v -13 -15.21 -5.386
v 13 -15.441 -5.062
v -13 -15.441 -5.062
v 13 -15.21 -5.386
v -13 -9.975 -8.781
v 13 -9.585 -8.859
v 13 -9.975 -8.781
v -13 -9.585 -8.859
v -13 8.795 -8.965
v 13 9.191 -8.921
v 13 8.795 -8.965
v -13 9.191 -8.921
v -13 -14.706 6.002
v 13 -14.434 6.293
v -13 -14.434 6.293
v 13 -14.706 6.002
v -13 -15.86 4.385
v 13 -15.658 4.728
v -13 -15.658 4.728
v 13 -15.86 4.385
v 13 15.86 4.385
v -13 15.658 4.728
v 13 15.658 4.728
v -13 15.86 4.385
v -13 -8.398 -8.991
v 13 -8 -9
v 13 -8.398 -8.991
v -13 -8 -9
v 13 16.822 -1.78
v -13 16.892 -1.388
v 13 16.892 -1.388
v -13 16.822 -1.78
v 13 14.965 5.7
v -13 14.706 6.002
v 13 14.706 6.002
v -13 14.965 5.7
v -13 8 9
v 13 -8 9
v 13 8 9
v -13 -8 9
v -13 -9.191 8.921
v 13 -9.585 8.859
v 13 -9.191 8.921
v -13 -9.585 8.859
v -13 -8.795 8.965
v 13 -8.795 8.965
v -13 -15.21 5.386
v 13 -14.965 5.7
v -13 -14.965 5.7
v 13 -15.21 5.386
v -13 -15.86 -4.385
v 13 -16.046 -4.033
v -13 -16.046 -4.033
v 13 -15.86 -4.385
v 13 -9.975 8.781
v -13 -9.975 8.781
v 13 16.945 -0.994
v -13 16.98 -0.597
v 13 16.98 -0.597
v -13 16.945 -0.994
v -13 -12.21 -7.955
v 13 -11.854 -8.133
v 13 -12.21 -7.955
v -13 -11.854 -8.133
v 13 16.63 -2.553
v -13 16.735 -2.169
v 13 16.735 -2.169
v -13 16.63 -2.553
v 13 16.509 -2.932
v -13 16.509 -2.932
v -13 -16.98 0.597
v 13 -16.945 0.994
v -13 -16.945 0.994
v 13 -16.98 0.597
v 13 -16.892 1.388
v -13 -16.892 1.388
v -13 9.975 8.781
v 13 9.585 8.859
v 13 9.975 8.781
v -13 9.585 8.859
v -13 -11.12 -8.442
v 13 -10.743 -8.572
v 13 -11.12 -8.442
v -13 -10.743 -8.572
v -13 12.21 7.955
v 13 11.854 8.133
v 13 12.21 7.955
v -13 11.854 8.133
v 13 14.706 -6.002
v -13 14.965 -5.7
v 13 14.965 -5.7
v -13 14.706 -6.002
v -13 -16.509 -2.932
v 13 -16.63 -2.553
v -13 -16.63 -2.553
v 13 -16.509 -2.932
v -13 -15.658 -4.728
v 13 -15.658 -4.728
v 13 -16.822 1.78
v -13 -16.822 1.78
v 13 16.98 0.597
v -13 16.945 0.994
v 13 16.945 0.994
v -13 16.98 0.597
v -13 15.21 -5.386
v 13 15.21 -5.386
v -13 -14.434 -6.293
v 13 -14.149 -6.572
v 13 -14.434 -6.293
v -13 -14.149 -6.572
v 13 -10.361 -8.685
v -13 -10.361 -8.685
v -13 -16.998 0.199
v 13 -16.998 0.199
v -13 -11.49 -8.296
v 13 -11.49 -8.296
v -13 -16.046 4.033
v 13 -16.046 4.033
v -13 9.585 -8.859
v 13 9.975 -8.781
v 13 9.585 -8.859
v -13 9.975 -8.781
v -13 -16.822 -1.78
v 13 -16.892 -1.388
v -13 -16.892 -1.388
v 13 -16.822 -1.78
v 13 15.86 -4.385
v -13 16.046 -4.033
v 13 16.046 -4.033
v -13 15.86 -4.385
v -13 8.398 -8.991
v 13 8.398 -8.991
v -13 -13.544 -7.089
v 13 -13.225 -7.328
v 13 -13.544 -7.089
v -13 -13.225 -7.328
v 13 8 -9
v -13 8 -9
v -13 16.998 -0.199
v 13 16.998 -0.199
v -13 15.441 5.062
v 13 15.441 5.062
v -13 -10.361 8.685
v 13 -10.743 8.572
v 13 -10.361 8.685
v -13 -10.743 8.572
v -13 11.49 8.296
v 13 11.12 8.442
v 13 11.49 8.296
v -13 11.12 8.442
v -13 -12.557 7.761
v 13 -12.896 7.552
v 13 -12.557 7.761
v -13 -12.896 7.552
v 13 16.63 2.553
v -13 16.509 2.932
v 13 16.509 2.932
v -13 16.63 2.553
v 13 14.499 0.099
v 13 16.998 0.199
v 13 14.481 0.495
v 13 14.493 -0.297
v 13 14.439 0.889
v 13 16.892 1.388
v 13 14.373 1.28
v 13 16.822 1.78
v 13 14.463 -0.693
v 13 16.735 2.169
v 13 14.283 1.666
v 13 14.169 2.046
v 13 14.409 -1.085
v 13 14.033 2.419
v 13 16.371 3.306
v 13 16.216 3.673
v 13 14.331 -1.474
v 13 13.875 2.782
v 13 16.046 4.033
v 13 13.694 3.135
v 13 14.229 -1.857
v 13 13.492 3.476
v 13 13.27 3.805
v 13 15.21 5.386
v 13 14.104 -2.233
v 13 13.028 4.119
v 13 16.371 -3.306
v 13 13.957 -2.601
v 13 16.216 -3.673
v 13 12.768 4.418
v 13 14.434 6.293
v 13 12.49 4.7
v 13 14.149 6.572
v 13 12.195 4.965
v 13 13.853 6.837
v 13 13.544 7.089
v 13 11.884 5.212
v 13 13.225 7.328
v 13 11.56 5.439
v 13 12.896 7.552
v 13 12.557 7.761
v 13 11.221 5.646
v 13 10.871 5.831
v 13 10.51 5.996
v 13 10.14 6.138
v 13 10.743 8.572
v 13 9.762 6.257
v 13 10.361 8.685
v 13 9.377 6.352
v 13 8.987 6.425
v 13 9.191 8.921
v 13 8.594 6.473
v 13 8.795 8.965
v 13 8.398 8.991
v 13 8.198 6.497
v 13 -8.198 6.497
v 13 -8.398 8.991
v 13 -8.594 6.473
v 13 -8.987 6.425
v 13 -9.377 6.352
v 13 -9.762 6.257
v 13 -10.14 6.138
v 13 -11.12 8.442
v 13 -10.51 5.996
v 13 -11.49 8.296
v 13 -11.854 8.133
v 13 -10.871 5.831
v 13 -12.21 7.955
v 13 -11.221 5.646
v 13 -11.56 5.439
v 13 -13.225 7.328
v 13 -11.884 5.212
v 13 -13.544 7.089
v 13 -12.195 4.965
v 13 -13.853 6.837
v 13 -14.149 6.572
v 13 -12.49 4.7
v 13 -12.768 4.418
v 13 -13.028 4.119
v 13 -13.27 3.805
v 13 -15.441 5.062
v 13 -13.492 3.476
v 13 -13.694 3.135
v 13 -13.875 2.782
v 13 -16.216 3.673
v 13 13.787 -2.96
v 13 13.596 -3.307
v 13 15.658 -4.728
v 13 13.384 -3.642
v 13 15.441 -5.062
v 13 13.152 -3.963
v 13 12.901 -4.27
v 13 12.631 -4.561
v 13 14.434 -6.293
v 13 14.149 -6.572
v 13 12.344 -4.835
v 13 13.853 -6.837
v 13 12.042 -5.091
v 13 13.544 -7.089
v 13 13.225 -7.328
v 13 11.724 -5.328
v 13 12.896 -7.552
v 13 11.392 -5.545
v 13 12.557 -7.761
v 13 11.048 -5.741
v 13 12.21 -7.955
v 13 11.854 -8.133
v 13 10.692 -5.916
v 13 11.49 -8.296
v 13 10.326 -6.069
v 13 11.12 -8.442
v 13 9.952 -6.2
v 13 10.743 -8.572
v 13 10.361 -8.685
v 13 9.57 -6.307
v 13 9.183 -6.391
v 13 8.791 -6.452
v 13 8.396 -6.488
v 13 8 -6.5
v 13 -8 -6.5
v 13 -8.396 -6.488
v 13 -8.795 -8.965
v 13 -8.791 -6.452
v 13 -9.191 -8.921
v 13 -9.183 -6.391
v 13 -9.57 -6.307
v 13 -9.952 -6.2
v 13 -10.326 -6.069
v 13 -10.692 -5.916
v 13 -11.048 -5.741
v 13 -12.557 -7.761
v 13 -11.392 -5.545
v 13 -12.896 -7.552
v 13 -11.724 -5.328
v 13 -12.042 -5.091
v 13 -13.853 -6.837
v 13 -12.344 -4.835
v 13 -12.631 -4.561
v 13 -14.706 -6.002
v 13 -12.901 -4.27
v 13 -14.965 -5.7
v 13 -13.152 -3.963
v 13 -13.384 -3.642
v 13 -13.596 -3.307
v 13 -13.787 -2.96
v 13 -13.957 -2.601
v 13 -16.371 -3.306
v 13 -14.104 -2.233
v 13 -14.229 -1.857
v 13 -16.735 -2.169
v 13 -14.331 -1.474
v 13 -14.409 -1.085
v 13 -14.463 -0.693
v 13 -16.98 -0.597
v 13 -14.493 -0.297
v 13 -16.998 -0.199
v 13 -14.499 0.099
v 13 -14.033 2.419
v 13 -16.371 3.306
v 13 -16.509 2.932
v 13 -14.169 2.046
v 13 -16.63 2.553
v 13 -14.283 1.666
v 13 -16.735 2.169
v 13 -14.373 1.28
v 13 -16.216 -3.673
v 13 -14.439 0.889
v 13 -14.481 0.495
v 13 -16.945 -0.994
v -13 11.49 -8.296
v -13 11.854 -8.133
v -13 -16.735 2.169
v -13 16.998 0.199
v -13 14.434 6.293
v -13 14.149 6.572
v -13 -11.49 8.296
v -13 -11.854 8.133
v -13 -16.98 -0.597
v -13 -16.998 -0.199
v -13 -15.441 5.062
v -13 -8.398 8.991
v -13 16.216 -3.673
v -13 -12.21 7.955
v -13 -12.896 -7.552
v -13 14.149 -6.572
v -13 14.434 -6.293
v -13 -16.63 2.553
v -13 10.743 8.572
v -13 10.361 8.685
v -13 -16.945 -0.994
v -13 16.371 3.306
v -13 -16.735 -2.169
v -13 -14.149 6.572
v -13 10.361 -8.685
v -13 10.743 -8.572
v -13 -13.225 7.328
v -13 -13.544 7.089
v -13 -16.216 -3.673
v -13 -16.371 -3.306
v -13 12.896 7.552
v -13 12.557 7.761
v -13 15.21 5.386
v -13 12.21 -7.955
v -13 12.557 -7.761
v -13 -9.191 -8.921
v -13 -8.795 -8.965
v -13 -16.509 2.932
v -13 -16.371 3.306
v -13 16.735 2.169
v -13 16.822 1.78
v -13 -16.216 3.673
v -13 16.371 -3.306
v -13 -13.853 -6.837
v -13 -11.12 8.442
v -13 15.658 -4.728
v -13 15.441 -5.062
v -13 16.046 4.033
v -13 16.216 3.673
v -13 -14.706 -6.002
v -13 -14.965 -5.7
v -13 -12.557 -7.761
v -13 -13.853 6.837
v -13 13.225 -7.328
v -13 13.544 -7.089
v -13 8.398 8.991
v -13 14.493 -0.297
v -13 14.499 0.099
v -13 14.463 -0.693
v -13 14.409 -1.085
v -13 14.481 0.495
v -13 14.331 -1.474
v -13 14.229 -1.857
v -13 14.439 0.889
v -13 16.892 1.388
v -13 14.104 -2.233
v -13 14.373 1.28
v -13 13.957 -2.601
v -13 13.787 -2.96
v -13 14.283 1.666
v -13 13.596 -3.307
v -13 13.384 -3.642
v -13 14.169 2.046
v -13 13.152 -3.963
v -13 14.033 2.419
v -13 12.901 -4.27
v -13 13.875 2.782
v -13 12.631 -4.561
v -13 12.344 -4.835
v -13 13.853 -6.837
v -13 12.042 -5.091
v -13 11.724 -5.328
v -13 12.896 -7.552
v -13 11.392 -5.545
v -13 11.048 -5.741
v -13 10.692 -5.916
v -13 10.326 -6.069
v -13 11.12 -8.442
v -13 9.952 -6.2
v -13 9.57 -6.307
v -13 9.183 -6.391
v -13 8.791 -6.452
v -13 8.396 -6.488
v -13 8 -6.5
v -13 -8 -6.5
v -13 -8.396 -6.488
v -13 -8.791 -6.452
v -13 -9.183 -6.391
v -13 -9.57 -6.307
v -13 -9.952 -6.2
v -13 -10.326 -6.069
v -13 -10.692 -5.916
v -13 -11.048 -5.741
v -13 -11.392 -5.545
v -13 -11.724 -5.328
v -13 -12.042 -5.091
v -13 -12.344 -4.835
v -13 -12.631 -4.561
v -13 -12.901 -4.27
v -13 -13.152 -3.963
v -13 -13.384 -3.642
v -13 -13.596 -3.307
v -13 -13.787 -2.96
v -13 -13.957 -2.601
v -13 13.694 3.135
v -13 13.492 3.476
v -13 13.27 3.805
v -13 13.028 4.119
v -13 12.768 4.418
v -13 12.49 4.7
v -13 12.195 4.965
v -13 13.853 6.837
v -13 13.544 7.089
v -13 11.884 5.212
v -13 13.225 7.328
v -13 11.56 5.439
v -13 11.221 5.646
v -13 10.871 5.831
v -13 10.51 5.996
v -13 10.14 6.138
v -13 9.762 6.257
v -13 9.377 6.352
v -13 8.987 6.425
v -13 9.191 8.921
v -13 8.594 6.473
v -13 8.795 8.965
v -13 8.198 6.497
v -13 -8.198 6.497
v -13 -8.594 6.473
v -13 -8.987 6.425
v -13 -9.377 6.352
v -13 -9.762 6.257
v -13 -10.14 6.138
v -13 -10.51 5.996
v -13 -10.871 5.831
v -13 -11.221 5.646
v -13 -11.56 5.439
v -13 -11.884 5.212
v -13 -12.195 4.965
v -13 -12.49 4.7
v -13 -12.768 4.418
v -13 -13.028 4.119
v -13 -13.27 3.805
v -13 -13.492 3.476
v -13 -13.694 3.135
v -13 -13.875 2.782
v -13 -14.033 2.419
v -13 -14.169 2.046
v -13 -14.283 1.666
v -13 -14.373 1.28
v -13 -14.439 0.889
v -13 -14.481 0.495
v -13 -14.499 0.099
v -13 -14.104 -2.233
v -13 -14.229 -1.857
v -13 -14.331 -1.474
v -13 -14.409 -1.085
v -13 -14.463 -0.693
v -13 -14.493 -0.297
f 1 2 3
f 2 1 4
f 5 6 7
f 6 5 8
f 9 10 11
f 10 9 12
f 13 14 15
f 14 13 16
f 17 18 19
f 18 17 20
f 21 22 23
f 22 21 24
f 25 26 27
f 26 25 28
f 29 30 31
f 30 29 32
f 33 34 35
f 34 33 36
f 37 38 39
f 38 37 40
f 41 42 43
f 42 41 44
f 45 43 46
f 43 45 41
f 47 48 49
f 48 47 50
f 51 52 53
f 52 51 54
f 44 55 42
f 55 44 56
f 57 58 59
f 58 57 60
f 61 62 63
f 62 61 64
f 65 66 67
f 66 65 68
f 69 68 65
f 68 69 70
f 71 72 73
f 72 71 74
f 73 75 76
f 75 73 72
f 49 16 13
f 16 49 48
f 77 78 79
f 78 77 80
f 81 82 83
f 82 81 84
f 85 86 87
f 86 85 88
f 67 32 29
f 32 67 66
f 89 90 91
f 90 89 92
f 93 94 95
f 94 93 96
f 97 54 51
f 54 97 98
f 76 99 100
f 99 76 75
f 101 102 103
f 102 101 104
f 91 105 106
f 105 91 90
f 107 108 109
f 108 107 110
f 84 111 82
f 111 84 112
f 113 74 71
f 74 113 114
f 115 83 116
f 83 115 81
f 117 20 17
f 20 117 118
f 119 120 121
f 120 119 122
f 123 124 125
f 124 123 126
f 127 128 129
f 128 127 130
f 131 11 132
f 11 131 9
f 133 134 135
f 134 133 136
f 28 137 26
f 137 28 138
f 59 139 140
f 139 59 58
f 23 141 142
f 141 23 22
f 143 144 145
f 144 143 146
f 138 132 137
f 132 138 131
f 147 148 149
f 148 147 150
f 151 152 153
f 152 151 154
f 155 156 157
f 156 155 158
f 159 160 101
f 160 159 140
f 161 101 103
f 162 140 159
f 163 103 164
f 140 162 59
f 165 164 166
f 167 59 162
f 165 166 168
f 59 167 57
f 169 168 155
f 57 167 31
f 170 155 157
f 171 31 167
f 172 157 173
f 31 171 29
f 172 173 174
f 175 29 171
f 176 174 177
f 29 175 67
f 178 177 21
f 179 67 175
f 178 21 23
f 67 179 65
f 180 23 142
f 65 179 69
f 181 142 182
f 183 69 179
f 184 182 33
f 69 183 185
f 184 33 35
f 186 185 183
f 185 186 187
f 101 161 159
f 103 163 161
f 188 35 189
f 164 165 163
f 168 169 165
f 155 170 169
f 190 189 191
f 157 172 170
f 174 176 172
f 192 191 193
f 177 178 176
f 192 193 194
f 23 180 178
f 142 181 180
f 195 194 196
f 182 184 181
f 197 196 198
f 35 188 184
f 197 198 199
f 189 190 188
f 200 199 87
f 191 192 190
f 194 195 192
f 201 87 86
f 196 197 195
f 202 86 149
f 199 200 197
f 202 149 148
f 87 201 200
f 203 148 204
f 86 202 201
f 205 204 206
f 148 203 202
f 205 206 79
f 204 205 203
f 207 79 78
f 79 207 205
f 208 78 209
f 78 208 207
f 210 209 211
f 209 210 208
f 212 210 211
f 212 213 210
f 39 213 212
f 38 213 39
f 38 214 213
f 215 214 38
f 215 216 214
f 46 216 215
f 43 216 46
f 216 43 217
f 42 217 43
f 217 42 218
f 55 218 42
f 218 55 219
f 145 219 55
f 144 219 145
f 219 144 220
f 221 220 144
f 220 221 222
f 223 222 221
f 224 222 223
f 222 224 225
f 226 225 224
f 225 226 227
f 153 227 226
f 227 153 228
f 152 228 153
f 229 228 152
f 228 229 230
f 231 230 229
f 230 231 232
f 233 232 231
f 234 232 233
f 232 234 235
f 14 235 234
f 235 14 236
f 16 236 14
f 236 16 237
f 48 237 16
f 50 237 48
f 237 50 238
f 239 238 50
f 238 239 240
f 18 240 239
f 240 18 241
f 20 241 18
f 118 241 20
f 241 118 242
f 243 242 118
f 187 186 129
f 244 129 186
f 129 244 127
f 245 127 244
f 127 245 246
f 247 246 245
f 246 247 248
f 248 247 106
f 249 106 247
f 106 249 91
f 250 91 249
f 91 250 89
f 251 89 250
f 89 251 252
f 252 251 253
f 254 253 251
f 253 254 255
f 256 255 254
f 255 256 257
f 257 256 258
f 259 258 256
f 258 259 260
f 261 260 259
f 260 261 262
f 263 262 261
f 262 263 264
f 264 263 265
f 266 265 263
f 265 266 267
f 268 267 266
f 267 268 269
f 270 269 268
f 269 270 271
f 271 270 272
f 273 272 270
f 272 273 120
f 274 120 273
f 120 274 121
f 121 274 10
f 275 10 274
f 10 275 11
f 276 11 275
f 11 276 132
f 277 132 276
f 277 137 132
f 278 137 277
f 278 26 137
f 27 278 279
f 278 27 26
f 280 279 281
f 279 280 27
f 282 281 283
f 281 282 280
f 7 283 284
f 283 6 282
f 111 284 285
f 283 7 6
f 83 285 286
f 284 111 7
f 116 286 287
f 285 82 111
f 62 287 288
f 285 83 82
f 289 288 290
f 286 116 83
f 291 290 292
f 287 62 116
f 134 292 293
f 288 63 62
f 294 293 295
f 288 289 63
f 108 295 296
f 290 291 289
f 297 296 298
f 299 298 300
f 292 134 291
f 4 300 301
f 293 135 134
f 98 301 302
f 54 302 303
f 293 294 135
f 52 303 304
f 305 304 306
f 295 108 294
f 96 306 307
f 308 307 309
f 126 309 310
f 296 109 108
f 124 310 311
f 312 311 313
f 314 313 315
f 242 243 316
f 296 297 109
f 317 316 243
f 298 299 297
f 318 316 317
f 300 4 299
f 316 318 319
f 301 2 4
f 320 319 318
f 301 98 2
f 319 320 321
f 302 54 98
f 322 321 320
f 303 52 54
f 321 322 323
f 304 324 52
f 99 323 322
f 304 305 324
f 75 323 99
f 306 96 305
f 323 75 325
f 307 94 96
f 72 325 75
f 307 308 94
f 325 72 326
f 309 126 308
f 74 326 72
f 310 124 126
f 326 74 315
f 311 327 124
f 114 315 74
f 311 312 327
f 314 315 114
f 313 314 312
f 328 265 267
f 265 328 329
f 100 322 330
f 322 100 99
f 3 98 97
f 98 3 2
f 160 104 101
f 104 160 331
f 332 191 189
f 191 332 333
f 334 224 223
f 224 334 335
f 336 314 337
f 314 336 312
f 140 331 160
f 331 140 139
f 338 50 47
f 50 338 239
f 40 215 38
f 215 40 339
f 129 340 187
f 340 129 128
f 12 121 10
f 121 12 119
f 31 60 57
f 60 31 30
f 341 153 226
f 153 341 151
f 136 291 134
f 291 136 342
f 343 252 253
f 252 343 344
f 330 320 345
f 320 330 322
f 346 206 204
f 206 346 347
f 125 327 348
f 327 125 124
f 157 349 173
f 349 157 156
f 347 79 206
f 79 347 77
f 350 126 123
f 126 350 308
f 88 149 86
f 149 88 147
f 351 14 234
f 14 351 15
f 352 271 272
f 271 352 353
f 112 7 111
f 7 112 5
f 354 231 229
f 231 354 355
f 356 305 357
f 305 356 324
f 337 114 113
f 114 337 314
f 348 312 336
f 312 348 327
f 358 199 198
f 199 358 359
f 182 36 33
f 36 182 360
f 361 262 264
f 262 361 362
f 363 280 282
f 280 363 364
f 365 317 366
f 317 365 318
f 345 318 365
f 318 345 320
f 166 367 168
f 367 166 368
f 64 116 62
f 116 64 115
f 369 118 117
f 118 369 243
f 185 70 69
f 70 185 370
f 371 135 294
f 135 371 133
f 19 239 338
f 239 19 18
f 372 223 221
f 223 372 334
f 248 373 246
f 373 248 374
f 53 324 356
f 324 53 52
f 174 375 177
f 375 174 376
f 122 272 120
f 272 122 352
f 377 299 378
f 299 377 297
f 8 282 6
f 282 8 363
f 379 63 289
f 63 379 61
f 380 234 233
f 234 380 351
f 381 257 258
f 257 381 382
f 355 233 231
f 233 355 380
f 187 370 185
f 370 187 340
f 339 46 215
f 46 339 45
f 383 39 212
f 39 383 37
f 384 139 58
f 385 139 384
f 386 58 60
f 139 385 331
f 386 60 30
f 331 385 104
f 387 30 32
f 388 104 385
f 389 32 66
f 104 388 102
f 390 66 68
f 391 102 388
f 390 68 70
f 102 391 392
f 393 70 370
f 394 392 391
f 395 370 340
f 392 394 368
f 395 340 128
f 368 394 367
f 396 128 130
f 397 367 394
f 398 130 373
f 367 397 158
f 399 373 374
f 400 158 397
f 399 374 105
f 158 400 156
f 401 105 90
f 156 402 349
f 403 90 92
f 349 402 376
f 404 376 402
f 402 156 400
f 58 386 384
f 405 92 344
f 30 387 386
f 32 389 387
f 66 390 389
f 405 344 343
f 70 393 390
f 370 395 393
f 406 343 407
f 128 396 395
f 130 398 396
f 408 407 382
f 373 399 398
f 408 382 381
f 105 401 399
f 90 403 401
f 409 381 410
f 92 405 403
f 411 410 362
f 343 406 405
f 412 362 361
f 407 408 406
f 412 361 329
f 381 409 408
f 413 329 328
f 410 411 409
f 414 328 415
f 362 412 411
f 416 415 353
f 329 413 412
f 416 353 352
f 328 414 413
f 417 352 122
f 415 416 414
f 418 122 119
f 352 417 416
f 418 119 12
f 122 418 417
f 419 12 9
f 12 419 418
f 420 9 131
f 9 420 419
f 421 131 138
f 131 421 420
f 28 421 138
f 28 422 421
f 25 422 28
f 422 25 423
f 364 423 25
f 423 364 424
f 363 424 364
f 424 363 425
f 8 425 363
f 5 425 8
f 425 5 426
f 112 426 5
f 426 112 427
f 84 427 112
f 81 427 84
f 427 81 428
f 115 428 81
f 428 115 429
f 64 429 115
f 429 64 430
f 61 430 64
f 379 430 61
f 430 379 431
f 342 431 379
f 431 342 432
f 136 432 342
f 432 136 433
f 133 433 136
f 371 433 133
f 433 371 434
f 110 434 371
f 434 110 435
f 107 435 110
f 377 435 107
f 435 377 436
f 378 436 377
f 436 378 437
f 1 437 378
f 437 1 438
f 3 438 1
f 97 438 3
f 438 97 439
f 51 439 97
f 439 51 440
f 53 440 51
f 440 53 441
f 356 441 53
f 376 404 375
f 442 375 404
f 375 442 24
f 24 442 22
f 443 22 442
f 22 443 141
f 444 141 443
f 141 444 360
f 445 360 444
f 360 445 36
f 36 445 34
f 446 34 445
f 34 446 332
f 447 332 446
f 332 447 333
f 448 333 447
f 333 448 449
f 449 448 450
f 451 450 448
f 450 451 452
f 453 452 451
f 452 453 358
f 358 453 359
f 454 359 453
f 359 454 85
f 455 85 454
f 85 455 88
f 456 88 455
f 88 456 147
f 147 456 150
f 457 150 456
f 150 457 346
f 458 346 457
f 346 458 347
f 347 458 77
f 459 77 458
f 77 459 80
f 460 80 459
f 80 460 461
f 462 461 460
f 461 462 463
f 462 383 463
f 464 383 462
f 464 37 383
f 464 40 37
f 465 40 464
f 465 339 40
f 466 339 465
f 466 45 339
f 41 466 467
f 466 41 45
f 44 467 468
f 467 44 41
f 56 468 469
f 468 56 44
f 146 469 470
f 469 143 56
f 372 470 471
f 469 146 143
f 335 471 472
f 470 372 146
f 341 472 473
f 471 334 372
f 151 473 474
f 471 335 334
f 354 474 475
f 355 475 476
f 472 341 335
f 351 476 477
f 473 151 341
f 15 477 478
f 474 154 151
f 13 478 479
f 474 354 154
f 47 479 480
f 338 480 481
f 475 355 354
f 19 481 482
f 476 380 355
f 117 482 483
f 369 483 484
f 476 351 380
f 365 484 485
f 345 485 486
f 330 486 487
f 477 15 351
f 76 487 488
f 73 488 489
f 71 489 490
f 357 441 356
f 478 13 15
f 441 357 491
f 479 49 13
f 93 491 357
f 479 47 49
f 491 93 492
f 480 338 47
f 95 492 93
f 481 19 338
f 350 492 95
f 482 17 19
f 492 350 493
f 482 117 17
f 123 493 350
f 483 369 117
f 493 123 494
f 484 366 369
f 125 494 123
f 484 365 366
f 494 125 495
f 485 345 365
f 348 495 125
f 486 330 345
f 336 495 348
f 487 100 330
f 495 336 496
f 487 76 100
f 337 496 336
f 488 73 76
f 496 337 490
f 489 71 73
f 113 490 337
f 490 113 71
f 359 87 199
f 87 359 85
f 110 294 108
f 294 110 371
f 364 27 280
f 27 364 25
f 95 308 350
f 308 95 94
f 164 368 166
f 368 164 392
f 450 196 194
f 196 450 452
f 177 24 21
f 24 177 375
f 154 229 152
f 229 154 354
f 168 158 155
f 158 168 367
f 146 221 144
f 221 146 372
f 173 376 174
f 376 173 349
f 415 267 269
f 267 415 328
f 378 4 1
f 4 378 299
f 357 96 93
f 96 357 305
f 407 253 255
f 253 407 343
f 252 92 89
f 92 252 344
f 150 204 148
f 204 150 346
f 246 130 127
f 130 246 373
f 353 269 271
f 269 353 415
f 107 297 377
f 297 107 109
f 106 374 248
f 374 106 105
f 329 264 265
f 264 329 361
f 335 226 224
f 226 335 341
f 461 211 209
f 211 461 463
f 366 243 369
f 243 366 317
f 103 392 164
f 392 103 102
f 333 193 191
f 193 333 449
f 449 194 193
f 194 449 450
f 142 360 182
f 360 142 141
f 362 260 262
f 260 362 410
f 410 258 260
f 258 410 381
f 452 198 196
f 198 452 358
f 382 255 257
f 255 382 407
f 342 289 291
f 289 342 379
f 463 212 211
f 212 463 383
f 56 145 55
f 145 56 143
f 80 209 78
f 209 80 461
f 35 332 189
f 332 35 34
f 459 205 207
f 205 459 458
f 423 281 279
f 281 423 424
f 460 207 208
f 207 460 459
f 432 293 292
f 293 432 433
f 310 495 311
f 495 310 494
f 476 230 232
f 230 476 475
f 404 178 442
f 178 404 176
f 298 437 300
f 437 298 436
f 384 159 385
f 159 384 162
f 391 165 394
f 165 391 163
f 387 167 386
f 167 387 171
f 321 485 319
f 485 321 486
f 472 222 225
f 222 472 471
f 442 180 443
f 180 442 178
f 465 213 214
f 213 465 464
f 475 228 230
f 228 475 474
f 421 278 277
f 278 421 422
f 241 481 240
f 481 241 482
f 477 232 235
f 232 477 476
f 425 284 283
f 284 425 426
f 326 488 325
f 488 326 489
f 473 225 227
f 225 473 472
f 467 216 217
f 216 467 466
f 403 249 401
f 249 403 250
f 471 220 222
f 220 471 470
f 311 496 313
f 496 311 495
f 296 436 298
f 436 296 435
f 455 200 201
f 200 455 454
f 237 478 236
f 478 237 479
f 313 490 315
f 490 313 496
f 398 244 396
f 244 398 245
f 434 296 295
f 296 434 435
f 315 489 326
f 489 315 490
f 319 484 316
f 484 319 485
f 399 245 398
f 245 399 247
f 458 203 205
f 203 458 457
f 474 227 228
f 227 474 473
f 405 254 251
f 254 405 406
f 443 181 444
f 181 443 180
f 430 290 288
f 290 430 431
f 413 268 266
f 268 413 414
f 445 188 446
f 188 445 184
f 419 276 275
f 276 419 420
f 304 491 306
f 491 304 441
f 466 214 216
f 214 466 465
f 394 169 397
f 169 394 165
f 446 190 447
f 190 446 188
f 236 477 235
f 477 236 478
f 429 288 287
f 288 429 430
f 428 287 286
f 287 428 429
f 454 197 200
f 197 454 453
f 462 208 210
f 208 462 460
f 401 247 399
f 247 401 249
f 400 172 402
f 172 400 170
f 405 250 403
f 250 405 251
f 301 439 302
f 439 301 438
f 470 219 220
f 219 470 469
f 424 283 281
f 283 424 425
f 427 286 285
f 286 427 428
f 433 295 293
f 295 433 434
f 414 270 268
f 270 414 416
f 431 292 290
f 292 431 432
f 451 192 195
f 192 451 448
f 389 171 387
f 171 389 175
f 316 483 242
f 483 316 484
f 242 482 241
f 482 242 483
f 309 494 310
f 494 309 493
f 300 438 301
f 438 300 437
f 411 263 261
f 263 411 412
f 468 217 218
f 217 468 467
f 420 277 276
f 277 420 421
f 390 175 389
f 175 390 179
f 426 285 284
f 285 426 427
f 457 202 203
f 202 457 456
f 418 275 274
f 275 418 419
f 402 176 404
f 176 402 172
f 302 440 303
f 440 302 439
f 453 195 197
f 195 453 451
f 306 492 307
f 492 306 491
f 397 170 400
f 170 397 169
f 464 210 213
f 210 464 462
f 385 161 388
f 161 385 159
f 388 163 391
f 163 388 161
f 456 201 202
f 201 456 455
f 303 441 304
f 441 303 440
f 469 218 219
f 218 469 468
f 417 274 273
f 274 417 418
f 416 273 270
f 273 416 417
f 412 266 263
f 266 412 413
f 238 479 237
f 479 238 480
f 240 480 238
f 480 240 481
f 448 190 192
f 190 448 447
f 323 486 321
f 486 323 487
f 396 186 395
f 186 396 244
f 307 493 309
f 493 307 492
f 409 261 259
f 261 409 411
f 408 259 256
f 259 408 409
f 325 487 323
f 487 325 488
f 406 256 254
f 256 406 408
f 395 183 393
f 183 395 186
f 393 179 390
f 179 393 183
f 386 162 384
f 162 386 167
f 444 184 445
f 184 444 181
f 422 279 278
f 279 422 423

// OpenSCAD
$fa = 2;
$fs = 0.4;

module gimbal_pitch_cradle() {
  color("#2c2c32")
    difference() {
      union() {
        hull() {
          translate([0, 8, 0]) rotate([0, 90, 0])
            cylinder(h = 26, d = 18, center = true);
          translate([0, -8, 0]) rotate([0, 90, 0])
            cylinder(h = 26, d = 18, center = true);
        }
        translate([-12, 0, 0])
          rotate([0, 90, 0])
            cylinder(h = 8, d = 16);
      }
      hull() {
        translate([0, 8, 0]) rotate([0, 90, 0])
          cylinder(h = 30, d = 13, center = true);
        translate([0, -8, 0]) rotate([0, 90, 0])
          cylinder(h = 30, d = 13, center = true);
      }
      rotate([0, 90, 0])
        cylinder(h = 30, d = 6, center = true);
    }
}

gimbal_pitch_cradle();
